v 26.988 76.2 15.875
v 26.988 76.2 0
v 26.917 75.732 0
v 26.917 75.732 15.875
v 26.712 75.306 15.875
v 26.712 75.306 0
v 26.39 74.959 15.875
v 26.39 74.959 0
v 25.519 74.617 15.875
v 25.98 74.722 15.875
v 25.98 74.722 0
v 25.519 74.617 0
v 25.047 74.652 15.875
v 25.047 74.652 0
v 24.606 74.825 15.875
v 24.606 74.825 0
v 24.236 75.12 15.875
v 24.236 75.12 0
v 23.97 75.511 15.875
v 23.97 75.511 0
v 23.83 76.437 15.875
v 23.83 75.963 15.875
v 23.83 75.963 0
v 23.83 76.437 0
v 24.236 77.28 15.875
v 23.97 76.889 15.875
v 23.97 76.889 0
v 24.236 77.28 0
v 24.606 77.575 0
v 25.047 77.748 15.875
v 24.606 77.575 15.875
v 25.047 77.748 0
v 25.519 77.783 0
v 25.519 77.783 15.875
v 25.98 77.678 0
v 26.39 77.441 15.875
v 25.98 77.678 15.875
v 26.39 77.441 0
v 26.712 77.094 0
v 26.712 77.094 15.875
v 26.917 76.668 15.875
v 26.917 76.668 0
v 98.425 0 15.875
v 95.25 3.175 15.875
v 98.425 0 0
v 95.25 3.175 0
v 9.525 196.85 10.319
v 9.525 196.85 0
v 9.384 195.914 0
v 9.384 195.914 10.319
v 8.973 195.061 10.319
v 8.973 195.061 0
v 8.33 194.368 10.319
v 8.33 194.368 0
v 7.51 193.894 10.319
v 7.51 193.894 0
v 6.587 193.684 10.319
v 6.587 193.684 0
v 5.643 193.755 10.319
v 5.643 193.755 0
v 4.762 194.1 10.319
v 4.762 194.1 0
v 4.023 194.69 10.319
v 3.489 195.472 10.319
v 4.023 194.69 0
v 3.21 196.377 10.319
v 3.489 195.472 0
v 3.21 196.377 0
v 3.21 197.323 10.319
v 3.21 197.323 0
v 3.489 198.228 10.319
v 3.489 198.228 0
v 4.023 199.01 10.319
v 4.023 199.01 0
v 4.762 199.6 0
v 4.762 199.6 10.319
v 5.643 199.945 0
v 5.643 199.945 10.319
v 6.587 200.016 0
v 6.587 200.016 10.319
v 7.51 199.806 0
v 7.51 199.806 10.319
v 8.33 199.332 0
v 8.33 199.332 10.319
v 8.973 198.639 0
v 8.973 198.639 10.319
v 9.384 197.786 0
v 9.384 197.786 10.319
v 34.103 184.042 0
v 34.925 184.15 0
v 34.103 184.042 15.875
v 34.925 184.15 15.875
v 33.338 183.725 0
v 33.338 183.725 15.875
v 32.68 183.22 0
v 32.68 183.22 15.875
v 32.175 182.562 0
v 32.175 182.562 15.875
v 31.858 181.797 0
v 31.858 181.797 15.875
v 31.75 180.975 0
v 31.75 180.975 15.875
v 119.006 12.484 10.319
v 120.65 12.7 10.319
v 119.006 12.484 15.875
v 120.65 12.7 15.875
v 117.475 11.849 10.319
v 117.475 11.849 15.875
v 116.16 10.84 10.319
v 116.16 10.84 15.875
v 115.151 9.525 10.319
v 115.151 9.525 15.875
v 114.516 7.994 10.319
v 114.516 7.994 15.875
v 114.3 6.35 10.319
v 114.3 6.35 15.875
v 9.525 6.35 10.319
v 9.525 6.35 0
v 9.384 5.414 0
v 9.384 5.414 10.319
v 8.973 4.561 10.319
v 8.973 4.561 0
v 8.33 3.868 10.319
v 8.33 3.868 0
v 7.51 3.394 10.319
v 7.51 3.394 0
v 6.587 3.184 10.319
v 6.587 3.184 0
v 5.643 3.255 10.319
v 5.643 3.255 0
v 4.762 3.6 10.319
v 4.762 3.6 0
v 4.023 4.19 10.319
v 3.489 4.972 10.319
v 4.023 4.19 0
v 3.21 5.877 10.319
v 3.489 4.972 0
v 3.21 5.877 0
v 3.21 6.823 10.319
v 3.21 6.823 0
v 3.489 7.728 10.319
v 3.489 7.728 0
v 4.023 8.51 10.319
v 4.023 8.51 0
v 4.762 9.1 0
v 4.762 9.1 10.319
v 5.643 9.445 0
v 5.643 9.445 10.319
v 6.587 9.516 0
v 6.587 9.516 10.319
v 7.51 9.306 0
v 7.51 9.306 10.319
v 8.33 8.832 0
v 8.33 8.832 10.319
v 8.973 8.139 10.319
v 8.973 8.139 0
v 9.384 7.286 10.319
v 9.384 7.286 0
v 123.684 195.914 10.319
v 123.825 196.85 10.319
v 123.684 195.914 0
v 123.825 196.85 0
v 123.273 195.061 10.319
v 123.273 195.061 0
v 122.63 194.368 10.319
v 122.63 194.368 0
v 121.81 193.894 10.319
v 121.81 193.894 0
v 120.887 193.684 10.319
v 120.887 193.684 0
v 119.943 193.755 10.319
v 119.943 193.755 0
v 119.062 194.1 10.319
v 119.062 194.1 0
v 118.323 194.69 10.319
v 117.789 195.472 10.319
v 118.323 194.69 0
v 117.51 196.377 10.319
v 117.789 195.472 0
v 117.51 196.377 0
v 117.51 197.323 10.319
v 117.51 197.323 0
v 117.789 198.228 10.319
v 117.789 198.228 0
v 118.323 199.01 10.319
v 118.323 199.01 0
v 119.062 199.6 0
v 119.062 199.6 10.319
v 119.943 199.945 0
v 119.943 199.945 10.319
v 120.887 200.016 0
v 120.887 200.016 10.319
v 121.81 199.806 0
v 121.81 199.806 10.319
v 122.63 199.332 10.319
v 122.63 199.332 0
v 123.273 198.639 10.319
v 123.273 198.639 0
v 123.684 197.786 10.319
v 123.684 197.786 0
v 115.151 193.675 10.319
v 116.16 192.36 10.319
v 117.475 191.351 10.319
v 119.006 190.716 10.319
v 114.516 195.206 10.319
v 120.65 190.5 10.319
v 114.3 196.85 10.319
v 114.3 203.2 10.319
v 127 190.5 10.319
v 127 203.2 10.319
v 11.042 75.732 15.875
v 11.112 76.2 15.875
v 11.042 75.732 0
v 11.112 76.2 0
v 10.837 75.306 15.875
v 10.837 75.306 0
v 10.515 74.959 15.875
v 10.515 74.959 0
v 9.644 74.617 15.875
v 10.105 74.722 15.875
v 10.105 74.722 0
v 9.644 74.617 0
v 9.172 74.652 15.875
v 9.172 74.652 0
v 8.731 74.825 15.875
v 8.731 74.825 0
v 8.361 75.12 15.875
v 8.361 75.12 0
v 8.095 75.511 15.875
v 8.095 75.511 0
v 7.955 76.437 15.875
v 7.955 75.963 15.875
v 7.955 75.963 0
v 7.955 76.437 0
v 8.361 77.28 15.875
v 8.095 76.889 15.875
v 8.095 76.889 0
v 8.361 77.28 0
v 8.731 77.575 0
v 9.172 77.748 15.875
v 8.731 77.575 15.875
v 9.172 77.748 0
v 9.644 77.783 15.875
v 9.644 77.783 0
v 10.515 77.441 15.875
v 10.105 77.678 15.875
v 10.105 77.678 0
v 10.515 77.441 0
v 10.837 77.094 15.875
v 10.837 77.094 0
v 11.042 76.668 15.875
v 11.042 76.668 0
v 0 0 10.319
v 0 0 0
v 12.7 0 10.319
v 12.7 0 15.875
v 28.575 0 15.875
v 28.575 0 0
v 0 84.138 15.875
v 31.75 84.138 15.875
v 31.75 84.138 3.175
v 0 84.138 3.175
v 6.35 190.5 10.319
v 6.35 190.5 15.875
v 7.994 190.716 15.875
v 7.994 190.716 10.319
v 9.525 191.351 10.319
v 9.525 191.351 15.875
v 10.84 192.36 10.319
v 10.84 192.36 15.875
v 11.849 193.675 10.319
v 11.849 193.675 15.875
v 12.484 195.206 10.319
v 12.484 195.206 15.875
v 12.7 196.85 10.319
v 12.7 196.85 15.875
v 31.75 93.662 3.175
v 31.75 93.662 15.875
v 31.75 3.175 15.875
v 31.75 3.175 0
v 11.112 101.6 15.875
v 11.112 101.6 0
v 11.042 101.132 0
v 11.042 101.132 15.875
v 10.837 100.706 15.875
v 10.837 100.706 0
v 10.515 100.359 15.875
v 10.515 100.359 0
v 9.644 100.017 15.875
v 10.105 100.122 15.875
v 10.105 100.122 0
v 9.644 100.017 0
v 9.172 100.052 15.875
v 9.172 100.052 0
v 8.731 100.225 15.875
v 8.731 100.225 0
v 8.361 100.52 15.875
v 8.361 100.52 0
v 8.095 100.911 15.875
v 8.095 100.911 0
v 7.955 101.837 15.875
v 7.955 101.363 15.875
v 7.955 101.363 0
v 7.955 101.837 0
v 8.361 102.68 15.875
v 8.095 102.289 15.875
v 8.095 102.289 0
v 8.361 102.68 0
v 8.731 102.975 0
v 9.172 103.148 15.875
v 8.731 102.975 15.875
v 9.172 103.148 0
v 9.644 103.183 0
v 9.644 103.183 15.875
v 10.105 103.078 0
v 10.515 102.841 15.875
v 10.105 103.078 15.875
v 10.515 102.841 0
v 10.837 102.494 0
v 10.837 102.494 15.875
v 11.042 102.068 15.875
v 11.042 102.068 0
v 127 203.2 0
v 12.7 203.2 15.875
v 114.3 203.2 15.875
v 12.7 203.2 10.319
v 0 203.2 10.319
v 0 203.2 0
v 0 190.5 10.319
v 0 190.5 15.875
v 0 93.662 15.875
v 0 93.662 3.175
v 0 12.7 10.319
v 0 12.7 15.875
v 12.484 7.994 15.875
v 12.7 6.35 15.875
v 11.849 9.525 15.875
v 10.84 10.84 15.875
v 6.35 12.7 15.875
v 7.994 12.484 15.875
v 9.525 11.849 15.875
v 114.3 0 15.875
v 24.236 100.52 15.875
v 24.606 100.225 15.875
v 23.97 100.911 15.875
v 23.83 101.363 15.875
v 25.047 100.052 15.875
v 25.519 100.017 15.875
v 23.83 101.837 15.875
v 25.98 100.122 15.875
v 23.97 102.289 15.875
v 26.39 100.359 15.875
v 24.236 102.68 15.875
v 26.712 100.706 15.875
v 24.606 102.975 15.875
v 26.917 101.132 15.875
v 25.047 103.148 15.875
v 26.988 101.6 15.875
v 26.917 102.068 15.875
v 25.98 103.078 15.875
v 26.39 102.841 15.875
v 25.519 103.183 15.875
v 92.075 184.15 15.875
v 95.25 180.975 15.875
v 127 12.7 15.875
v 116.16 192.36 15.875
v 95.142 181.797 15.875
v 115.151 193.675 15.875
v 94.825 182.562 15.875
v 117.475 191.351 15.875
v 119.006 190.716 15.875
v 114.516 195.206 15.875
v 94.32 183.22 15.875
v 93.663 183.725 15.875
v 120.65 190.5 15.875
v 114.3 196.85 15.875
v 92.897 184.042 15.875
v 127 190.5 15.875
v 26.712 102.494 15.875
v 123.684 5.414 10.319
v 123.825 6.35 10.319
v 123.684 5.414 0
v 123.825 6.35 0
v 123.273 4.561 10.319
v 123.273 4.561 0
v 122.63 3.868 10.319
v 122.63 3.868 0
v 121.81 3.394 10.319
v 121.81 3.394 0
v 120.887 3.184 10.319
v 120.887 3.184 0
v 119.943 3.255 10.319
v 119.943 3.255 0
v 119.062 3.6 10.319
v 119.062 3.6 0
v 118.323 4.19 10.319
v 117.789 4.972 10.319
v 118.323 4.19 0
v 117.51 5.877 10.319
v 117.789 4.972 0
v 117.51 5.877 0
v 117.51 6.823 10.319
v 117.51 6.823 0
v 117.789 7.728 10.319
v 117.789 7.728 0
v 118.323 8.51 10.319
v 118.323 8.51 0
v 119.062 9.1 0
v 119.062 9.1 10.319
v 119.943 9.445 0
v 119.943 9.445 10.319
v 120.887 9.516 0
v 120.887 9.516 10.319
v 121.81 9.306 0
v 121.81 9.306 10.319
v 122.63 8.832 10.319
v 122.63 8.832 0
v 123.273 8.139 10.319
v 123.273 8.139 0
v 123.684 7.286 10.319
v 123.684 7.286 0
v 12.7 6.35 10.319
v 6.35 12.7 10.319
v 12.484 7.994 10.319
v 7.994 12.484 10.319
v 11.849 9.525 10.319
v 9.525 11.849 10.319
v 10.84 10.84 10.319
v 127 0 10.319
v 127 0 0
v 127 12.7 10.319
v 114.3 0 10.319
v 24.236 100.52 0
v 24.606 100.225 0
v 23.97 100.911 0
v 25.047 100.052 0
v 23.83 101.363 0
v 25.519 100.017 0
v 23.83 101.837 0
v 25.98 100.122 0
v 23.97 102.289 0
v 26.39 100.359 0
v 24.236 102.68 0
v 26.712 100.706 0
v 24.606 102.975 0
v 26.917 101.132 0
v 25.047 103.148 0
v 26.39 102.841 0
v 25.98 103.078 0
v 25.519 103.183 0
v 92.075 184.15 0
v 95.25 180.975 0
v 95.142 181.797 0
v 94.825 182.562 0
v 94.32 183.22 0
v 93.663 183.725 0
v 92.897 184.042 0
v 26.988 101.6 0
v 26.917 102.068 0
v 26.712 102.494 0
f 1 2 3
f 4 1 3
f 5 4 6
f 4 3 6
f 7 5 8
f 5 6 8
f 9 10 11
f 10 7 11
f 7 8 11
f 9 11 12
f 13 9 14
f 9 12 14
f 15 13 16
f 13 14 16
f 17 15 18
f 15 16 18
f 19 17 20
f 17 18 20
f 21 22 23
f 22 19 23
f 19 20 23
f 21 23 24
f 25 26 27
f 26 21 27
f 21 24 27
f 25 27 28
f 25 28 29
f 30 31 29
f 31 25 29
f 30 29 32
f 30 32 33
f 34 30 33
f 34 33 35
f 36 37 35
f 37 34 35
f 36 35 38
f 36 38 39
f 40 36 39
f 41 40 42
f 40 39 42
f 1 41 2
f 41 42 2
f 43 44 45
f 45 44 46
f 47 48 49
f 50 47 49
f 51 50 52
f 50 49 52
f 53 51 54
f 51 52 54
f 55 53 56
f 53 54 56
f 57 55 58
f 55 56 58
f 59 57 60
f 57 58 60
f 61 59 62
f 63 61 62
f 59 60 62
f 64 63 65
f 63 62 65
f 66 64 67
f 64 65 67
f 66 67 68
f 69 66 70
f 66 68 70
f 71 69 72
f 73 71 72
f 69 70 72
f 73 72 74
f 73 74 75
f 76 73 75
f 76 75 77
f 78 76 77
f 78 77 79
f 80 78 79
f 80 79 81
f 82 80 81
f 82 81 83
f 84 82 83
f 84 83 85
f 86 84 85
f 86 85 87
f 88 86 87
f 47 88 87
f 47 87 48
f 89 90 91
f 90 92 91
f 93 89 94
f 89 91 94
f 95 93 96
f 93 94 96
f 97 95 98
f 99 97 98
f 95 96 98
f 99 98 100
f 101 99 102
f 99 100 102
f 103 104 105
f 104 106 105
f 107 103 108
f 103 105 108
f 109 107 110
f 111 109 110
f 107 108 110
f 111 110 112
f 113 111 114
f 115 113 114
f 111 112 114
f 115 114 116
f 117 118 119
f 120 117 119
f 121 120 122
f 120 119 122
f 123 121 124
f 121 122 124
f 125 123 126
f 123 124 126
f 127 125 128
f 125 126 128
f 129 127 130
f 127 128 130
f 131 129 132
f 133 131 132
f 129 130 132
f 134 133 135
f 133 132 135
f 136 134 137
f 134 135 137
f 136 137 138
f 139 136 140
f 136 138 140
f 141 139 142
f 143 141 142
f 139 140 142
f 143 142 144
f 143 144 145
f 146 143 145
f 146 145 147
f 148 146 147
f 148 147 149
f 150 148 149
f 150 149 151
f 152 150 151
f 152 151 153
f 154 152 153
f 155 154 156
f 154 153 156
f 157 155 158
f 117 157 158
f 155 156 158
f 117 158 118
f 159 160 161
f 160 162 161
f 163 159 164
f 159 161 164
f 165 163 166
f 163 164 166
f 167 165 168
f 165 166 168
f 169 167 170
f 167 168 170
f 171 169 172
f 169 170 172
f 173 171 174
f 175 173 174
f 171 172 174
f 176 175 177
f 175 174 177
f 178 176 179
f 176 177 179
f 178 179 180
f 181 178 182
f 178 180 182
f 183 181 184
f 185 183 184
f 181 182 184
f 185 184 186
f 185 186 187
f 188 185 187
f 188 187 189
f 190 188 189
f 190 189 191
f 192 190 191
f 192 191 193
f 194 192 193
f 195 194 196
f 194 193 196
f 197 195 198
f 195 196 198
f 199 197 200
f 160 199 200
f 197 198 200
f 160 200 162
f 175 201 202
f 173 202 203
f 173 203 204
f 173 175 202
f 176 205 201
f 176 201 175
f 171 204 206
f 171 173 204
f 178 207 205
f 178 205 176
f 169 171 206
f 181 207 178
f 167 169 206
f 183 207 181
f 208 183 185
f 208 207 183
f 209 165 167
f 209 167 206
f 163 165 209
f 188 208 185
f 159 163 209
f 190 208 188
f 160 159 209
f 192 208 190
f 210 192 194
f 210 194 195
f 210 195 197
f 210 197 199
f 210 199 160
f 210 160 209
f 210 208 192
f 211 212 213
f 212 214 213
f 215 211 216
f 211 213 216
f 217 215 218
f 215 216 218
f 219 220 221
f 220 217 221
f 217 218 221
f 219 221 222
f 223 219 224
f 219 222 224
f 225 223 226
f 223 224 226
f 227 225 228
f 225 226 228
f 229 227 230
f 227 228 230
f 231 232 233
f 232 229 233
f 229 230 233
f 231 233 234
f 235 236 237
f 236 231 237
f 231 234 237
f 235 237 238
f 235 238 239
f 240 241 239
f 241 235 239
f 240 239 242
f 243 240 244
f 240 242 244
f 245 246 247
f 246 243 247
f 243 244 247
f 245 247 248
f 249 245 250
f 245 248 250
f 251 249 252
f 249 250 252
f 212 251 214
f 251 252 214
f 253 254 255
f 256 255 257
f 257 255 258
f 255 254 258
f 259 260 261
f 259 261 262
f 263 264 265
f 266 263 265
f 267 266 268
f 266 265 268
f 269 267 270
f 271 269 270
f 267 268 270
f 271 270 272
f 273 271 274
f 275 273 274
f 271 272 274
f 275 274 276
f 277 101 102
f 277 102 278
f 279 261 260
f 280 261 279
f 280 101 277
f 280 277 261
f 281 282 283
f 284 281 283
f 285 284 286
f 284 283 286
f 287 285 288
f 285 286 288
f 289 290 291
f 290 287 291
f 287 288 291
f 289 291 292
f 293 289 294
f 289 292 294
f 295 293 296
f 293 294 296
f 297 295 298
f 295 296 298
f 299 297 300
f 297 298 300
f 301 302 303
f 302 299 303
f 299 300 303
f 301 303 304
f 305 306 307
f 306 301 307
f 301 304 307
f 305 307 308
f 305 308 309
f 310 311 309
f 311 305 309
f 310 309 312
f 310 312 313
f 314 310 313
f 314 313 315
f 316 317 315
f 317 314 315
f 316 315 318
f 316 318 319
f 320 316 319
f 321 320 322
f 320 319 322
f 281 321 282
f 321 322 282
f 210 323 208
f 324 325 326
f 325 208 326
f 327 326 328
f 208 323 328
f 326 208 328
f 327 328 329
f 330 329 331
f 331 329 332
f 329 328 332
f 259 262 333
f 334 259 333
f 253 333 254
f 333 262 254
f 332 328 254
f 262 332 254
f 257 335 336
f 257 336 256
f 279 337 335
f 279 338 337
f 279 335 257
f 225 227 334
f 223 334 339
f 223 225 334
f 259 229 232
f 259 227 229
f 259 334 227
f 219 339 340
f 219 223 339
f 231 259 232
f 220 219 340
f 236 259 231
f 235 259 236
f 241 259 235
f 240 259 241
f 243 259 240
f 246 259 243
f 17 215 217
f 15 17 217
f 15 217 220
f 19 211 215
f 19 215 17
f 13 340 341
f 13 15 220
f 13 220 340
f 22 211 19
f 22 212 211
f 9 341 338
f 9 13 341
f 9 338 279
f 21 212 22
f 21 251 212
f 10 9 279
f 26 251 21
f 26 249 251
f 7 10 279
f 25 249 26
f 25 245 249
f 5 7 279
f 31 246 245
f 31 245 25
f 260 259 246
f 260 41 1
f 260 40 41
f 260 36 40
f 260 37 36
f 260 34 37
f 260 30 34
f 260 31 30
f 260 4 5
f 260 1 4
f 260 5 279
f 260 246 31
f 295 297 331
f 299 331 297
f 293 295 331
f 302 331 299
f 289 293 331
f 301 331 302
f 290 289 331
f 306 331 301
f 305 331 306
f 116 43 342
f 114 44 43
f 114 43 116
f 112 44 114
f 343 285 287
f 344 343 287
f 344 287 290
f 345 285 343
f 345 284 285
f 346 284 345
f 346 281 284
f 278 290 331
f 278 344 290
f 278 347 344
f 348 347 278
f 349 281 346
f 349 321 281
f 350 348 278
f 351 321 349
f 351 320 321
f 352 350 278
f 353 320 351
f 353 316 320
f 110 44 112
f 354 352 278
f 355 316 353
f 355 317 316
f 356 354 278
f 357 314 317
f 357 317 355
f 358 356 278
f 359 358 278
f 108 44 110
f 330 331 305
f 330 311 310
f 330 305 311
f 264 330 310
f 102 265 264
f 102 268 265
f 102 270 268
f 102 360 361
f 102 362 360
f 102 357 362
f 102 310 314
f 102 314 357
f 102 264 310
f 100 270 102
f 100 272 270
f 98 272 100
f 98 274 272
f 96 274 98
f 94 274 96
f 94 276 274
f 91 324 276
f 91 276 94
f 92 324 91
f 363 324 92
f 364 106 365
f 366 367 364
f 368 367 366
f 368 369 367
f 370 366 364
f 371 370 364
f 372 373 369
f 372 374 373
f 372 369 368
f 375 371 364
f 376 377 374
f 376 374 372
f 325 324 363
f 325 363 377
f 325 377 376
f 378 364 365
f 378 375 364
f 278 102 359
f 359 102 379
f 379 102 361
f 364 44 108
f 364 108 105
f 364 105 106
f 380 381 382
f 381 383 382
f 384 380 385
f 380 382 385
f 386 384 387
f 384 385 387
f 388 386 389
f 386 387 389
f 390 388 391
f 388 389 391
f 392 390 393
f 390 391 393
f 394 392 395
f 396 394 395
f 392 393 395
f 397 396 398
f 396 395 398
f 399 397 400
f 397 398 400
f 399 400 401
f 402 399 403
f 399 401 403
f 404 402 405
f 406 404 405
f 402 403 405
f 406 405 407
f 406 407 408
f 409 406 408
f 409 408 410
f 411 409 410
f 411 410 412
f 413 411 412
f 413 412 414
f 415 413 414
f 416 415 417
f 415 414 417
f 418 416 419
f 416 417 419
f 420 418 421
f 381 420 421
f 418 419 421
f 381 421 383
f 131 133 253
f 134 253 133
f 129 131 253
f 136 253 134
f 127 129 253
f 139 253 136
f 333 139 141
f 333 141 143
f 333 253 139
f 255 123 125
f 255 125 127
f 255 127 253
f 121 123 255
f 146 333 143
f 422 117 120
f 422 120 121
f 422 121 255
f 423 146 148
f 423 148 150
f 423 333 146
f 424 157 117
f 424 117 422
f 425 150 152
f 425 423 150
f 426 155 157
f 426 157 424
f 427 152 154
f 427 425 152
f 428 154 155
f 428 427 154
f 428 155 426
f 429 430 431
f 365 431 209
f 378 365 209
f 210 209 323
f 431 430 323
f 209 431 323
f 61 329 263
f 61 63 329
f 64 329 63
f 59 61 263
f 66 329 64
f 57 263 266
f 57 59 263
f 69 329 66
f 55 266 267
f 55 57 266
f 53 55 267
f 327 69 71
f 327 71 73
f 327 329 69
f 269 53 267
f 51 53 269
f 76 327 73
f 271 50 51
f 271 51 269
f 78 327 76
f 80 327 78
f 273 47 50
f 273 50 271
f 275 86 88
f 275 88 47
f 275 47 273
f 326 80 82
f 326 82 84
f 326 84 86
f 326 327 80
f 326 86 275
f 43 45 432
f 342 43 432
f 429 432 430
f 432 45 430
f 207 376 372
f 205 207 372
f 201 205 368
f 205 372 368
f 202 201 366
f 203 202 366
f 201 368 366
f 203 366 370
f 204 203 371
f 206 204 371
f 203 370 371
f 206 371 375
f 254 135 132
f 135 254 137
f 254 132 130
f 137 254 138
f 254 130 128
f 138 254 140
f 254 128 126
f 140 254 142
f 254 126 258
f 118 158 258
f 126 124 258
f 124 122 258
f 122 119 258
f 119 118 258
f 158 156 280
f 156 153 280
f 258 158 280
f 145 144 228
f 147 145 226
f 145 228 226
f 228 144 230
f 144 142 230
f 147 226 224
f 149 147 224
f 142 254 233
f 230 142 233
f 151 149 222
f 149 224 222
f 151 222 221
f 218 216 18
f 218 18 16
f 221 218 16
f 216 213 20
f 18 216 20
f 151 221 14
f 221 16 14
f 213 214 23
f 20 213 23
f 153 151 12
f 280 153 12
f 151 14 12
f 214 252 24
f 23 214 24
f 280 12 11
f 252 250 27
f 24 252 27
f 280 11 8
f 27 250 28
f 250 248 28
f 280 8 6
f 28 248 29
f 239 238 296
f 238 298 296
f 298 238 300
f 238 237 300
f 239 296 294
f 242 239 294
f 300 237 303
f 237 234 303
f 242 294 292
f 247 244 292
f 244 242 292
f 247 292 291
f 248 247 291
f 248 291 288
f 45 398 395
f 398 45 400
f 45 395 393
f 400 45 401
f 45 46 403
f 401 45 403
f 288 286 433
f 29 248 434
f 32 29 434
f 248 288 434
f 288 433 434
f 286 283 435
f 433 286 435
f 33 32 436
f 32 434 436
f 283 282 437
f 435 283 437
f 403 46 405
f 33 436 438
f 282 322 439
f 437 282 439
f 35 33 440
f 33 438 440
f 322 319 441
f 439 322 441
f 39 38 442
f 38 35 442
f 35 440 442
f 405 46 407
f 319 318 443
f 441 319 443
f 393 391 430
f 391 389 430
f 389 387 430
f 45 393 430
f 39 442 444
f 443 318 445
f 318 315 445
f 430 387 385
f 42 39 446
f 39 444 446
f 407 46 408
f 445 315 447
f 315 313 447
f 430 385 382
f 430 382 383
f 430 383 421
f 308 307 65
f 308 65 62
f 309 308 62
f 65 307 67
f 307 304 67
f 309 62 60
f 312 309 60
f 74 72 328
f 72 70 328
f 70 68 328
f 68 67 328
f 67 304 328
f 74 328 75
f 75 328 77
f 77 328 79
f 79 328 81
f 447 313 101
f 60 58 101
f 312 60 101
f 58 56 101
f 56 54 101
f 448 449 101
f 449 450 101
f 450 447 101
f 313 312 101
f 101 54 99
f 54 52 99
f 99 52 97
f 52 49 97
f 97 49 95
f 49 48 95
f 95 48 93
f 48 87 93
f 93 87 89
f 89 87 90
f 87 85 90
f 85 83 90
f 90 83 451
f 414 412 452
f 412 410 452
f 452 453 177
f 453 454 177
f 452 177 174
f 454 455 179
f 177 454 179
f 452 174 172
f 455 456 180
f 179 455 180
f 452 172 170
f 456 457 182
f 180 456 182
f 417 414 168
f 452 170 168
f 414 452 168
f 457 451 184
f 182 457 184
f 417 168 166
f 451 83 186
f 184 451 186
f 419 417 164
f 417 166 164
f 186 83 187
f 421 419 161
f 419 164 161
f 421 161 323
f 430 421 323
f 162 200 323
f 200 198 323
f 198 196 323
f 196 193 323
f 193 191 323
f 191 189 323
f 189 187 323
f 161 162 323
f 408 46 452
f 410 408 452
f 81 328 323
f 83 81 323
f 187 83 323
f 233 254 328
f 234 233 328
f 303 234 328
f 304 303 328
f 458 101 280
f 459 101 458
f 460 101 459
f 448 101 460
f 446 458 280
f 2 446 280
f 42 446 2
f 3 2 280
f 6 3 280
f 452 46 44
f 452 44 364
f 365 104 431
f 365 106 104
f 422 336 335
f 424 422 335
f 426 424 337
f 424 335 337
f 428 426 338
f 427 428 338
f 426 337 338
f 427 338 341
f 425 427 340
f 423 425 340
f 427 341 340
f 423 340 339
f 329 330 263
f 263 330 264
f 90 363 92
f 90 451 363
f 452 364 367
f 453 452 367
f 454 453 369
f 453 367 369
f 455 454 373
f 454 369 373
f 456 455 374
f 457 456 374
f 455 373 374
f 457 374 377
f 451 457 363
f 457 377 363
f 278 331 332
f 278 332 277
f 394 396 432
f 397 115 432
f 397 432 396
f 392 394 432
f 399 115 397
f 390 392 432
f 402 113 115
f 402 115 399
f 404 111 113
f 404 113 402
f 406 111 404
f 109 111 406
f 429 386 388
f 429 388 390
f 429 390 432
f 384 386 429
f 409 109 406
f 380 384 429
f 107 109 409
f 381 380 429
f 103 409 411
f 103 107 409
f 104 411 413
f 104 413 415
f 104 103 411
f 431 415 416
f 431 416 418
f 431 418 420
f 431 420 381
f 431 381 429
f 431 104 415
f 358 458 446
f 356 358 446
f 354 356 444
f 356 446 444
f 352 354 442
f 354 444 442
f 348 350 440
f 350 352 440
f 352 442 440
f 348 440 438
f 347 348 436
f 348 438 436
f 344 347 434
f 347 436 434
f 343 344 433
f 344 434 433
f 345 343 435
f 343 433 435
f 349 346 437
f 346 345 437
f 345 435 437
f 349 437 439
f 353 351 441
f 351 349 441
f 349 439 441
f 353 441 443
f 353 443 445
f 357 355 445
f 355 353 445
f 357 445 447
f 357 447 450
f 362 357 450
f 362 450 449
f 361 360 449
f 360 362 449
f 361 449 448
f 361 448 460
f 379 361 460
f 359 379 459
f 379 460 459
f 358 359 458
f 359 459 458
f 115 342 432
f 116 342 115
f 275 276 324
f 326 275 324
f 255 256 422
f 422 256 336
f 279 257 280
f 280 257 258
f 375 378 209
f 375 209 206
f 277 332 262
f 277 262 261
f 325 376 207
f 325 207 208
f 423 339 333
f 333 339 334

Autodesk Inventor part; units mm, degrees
ref_plane "YZ Plane" through (0, 0, 0) normal (1, 0, 0) x (0, 1, 0)
ref_plane "XZ Plane" through (0, 0, 0) normal (0, 1, 0) x (-1, 0, 0)
ref_plane "XY Plane" through (0, 0, 0) normal (0, 0, 1) x (1, 0, 0)
sketch "Sketch1" plane through (0, 0, 0) normal (0, 0, 1) x (1, 0, 0)
  line L0 (127, 0) -> (127, 203.2)
  line L1 (127, 203.2) -> (0, 203.2)
  line L2 (0, 203.2) -> (0, 0)
  line L3 (95.25, 0) -> (95.25, 184.15)
  line L4 (95.25, 184.15) -> (31.75, 184.15)
  line L5 (31.75, 184.15) -> (31.75, 0)
  line L6 (0, 0) -> (31.75, 0)
  line L7 (95.25, 0) -> (127, 0)
  circle A0 centre (6.35, 6.35) radius 3.175
  circle A1 centre (120.65, 6.35) radius 3.175
  circle A2 centre (6.35, 196.85) radius 3.175
  circle A3 centre (120.65, 196.85) radius 3.175
  circle A4 centre (9.525, 101.6) radius 1.5875
  circle A5 centre (25.4, 101.6) radius 1.5875
  circle A6 centre (9.525, 76.2) radius 1.5875
  circle A7 centre (25.4, 76.2) radius 1.5875
extrude "Extrusion1" add sketch "Sketch1" along normal blind 15.875
chamfer "Chamfer1" distance 3.175 angle 45 2 edges at (31.75, 0, 7.9375) (95.25, 0, 7.9375)
fillet "Fillet1" radius 3.175 2 edges at (31.75, 184.15, 7.9375) (95.25, 184.15, 7.9375)
sketch "Sketch2" plane through (0, 0, 15.875) normal (0, 0, 1) x (1, 0, 0)
  arc A0 (6.35, 190.5) -> (12.7, 196.85) centre (6.35, 196.85) ccw
  line L0 (12.7, 196.85) -> (12.7, 203.2)
  line L1 (12.7, 203.2) -> (0, 203.2)
  line L2 (0, 203.2) -> (0, 190.5)
  line L3 (0, 190.5) -> (6.35, 190.5)
  arc A1 (114.3, 196.85) -> (120.65, 190.5) centre (120.65, 196.85) ccw
  line L4 (114.3, 196.85) -> (114.3, 203.2)
  line L5 (114.3, 203.2) -> (127, 203.2)
  line L6 (127, 203.2) -> (127, 190.5)
  line L7 (127, 190.5) -> (120.65, 190.5)
  arc A2 (12.7, 6.35) -> (6.35, 12.7) centre (6.35, 6.35) ccw
  line L8 (6.35, 12.7) -> (0, 12.7)
  line L9 (0, 12.7) -> (0, 0)
  line L10 (0, 0) -> (12.7, 0)
  line L11 (12.7, 0) -> (12.7, 6.35)
  arc A3 (120.65, 12.7) -> (114.3, 6.35) centre (120.65, 6.35) ccw
  line L12 (120.65, 12.7) -> (127, 12.7)
  line L13 (127, 12.7) -> (127, 0)
  line L14 (127, 0) -> (114.3, 0)
  line L15 (114.3, 0) -> (114.3, 6.35)
extrude "Extrusion2" cut sketch "Sketch2" against normal blind 5.5563
sketch "Sketch3" plane through (0, 0, 15.875) normal (0, 0, 1) x (1, 0, 0)
  line L0 (0, 93.6625) -> (31.75, 93.6625)
  line L1 (31.75, 93.6625) -> (31.75, 84.1375)
  line L2 (31.75, 84.1375) -> (0, 84.1375)
  line L3 (0, 84.1375) -> (0, 93.6625)
extrude "Extrusion3" cut sketch "Sketch3" against normal blind 12.7
properties part number "escapement base"
